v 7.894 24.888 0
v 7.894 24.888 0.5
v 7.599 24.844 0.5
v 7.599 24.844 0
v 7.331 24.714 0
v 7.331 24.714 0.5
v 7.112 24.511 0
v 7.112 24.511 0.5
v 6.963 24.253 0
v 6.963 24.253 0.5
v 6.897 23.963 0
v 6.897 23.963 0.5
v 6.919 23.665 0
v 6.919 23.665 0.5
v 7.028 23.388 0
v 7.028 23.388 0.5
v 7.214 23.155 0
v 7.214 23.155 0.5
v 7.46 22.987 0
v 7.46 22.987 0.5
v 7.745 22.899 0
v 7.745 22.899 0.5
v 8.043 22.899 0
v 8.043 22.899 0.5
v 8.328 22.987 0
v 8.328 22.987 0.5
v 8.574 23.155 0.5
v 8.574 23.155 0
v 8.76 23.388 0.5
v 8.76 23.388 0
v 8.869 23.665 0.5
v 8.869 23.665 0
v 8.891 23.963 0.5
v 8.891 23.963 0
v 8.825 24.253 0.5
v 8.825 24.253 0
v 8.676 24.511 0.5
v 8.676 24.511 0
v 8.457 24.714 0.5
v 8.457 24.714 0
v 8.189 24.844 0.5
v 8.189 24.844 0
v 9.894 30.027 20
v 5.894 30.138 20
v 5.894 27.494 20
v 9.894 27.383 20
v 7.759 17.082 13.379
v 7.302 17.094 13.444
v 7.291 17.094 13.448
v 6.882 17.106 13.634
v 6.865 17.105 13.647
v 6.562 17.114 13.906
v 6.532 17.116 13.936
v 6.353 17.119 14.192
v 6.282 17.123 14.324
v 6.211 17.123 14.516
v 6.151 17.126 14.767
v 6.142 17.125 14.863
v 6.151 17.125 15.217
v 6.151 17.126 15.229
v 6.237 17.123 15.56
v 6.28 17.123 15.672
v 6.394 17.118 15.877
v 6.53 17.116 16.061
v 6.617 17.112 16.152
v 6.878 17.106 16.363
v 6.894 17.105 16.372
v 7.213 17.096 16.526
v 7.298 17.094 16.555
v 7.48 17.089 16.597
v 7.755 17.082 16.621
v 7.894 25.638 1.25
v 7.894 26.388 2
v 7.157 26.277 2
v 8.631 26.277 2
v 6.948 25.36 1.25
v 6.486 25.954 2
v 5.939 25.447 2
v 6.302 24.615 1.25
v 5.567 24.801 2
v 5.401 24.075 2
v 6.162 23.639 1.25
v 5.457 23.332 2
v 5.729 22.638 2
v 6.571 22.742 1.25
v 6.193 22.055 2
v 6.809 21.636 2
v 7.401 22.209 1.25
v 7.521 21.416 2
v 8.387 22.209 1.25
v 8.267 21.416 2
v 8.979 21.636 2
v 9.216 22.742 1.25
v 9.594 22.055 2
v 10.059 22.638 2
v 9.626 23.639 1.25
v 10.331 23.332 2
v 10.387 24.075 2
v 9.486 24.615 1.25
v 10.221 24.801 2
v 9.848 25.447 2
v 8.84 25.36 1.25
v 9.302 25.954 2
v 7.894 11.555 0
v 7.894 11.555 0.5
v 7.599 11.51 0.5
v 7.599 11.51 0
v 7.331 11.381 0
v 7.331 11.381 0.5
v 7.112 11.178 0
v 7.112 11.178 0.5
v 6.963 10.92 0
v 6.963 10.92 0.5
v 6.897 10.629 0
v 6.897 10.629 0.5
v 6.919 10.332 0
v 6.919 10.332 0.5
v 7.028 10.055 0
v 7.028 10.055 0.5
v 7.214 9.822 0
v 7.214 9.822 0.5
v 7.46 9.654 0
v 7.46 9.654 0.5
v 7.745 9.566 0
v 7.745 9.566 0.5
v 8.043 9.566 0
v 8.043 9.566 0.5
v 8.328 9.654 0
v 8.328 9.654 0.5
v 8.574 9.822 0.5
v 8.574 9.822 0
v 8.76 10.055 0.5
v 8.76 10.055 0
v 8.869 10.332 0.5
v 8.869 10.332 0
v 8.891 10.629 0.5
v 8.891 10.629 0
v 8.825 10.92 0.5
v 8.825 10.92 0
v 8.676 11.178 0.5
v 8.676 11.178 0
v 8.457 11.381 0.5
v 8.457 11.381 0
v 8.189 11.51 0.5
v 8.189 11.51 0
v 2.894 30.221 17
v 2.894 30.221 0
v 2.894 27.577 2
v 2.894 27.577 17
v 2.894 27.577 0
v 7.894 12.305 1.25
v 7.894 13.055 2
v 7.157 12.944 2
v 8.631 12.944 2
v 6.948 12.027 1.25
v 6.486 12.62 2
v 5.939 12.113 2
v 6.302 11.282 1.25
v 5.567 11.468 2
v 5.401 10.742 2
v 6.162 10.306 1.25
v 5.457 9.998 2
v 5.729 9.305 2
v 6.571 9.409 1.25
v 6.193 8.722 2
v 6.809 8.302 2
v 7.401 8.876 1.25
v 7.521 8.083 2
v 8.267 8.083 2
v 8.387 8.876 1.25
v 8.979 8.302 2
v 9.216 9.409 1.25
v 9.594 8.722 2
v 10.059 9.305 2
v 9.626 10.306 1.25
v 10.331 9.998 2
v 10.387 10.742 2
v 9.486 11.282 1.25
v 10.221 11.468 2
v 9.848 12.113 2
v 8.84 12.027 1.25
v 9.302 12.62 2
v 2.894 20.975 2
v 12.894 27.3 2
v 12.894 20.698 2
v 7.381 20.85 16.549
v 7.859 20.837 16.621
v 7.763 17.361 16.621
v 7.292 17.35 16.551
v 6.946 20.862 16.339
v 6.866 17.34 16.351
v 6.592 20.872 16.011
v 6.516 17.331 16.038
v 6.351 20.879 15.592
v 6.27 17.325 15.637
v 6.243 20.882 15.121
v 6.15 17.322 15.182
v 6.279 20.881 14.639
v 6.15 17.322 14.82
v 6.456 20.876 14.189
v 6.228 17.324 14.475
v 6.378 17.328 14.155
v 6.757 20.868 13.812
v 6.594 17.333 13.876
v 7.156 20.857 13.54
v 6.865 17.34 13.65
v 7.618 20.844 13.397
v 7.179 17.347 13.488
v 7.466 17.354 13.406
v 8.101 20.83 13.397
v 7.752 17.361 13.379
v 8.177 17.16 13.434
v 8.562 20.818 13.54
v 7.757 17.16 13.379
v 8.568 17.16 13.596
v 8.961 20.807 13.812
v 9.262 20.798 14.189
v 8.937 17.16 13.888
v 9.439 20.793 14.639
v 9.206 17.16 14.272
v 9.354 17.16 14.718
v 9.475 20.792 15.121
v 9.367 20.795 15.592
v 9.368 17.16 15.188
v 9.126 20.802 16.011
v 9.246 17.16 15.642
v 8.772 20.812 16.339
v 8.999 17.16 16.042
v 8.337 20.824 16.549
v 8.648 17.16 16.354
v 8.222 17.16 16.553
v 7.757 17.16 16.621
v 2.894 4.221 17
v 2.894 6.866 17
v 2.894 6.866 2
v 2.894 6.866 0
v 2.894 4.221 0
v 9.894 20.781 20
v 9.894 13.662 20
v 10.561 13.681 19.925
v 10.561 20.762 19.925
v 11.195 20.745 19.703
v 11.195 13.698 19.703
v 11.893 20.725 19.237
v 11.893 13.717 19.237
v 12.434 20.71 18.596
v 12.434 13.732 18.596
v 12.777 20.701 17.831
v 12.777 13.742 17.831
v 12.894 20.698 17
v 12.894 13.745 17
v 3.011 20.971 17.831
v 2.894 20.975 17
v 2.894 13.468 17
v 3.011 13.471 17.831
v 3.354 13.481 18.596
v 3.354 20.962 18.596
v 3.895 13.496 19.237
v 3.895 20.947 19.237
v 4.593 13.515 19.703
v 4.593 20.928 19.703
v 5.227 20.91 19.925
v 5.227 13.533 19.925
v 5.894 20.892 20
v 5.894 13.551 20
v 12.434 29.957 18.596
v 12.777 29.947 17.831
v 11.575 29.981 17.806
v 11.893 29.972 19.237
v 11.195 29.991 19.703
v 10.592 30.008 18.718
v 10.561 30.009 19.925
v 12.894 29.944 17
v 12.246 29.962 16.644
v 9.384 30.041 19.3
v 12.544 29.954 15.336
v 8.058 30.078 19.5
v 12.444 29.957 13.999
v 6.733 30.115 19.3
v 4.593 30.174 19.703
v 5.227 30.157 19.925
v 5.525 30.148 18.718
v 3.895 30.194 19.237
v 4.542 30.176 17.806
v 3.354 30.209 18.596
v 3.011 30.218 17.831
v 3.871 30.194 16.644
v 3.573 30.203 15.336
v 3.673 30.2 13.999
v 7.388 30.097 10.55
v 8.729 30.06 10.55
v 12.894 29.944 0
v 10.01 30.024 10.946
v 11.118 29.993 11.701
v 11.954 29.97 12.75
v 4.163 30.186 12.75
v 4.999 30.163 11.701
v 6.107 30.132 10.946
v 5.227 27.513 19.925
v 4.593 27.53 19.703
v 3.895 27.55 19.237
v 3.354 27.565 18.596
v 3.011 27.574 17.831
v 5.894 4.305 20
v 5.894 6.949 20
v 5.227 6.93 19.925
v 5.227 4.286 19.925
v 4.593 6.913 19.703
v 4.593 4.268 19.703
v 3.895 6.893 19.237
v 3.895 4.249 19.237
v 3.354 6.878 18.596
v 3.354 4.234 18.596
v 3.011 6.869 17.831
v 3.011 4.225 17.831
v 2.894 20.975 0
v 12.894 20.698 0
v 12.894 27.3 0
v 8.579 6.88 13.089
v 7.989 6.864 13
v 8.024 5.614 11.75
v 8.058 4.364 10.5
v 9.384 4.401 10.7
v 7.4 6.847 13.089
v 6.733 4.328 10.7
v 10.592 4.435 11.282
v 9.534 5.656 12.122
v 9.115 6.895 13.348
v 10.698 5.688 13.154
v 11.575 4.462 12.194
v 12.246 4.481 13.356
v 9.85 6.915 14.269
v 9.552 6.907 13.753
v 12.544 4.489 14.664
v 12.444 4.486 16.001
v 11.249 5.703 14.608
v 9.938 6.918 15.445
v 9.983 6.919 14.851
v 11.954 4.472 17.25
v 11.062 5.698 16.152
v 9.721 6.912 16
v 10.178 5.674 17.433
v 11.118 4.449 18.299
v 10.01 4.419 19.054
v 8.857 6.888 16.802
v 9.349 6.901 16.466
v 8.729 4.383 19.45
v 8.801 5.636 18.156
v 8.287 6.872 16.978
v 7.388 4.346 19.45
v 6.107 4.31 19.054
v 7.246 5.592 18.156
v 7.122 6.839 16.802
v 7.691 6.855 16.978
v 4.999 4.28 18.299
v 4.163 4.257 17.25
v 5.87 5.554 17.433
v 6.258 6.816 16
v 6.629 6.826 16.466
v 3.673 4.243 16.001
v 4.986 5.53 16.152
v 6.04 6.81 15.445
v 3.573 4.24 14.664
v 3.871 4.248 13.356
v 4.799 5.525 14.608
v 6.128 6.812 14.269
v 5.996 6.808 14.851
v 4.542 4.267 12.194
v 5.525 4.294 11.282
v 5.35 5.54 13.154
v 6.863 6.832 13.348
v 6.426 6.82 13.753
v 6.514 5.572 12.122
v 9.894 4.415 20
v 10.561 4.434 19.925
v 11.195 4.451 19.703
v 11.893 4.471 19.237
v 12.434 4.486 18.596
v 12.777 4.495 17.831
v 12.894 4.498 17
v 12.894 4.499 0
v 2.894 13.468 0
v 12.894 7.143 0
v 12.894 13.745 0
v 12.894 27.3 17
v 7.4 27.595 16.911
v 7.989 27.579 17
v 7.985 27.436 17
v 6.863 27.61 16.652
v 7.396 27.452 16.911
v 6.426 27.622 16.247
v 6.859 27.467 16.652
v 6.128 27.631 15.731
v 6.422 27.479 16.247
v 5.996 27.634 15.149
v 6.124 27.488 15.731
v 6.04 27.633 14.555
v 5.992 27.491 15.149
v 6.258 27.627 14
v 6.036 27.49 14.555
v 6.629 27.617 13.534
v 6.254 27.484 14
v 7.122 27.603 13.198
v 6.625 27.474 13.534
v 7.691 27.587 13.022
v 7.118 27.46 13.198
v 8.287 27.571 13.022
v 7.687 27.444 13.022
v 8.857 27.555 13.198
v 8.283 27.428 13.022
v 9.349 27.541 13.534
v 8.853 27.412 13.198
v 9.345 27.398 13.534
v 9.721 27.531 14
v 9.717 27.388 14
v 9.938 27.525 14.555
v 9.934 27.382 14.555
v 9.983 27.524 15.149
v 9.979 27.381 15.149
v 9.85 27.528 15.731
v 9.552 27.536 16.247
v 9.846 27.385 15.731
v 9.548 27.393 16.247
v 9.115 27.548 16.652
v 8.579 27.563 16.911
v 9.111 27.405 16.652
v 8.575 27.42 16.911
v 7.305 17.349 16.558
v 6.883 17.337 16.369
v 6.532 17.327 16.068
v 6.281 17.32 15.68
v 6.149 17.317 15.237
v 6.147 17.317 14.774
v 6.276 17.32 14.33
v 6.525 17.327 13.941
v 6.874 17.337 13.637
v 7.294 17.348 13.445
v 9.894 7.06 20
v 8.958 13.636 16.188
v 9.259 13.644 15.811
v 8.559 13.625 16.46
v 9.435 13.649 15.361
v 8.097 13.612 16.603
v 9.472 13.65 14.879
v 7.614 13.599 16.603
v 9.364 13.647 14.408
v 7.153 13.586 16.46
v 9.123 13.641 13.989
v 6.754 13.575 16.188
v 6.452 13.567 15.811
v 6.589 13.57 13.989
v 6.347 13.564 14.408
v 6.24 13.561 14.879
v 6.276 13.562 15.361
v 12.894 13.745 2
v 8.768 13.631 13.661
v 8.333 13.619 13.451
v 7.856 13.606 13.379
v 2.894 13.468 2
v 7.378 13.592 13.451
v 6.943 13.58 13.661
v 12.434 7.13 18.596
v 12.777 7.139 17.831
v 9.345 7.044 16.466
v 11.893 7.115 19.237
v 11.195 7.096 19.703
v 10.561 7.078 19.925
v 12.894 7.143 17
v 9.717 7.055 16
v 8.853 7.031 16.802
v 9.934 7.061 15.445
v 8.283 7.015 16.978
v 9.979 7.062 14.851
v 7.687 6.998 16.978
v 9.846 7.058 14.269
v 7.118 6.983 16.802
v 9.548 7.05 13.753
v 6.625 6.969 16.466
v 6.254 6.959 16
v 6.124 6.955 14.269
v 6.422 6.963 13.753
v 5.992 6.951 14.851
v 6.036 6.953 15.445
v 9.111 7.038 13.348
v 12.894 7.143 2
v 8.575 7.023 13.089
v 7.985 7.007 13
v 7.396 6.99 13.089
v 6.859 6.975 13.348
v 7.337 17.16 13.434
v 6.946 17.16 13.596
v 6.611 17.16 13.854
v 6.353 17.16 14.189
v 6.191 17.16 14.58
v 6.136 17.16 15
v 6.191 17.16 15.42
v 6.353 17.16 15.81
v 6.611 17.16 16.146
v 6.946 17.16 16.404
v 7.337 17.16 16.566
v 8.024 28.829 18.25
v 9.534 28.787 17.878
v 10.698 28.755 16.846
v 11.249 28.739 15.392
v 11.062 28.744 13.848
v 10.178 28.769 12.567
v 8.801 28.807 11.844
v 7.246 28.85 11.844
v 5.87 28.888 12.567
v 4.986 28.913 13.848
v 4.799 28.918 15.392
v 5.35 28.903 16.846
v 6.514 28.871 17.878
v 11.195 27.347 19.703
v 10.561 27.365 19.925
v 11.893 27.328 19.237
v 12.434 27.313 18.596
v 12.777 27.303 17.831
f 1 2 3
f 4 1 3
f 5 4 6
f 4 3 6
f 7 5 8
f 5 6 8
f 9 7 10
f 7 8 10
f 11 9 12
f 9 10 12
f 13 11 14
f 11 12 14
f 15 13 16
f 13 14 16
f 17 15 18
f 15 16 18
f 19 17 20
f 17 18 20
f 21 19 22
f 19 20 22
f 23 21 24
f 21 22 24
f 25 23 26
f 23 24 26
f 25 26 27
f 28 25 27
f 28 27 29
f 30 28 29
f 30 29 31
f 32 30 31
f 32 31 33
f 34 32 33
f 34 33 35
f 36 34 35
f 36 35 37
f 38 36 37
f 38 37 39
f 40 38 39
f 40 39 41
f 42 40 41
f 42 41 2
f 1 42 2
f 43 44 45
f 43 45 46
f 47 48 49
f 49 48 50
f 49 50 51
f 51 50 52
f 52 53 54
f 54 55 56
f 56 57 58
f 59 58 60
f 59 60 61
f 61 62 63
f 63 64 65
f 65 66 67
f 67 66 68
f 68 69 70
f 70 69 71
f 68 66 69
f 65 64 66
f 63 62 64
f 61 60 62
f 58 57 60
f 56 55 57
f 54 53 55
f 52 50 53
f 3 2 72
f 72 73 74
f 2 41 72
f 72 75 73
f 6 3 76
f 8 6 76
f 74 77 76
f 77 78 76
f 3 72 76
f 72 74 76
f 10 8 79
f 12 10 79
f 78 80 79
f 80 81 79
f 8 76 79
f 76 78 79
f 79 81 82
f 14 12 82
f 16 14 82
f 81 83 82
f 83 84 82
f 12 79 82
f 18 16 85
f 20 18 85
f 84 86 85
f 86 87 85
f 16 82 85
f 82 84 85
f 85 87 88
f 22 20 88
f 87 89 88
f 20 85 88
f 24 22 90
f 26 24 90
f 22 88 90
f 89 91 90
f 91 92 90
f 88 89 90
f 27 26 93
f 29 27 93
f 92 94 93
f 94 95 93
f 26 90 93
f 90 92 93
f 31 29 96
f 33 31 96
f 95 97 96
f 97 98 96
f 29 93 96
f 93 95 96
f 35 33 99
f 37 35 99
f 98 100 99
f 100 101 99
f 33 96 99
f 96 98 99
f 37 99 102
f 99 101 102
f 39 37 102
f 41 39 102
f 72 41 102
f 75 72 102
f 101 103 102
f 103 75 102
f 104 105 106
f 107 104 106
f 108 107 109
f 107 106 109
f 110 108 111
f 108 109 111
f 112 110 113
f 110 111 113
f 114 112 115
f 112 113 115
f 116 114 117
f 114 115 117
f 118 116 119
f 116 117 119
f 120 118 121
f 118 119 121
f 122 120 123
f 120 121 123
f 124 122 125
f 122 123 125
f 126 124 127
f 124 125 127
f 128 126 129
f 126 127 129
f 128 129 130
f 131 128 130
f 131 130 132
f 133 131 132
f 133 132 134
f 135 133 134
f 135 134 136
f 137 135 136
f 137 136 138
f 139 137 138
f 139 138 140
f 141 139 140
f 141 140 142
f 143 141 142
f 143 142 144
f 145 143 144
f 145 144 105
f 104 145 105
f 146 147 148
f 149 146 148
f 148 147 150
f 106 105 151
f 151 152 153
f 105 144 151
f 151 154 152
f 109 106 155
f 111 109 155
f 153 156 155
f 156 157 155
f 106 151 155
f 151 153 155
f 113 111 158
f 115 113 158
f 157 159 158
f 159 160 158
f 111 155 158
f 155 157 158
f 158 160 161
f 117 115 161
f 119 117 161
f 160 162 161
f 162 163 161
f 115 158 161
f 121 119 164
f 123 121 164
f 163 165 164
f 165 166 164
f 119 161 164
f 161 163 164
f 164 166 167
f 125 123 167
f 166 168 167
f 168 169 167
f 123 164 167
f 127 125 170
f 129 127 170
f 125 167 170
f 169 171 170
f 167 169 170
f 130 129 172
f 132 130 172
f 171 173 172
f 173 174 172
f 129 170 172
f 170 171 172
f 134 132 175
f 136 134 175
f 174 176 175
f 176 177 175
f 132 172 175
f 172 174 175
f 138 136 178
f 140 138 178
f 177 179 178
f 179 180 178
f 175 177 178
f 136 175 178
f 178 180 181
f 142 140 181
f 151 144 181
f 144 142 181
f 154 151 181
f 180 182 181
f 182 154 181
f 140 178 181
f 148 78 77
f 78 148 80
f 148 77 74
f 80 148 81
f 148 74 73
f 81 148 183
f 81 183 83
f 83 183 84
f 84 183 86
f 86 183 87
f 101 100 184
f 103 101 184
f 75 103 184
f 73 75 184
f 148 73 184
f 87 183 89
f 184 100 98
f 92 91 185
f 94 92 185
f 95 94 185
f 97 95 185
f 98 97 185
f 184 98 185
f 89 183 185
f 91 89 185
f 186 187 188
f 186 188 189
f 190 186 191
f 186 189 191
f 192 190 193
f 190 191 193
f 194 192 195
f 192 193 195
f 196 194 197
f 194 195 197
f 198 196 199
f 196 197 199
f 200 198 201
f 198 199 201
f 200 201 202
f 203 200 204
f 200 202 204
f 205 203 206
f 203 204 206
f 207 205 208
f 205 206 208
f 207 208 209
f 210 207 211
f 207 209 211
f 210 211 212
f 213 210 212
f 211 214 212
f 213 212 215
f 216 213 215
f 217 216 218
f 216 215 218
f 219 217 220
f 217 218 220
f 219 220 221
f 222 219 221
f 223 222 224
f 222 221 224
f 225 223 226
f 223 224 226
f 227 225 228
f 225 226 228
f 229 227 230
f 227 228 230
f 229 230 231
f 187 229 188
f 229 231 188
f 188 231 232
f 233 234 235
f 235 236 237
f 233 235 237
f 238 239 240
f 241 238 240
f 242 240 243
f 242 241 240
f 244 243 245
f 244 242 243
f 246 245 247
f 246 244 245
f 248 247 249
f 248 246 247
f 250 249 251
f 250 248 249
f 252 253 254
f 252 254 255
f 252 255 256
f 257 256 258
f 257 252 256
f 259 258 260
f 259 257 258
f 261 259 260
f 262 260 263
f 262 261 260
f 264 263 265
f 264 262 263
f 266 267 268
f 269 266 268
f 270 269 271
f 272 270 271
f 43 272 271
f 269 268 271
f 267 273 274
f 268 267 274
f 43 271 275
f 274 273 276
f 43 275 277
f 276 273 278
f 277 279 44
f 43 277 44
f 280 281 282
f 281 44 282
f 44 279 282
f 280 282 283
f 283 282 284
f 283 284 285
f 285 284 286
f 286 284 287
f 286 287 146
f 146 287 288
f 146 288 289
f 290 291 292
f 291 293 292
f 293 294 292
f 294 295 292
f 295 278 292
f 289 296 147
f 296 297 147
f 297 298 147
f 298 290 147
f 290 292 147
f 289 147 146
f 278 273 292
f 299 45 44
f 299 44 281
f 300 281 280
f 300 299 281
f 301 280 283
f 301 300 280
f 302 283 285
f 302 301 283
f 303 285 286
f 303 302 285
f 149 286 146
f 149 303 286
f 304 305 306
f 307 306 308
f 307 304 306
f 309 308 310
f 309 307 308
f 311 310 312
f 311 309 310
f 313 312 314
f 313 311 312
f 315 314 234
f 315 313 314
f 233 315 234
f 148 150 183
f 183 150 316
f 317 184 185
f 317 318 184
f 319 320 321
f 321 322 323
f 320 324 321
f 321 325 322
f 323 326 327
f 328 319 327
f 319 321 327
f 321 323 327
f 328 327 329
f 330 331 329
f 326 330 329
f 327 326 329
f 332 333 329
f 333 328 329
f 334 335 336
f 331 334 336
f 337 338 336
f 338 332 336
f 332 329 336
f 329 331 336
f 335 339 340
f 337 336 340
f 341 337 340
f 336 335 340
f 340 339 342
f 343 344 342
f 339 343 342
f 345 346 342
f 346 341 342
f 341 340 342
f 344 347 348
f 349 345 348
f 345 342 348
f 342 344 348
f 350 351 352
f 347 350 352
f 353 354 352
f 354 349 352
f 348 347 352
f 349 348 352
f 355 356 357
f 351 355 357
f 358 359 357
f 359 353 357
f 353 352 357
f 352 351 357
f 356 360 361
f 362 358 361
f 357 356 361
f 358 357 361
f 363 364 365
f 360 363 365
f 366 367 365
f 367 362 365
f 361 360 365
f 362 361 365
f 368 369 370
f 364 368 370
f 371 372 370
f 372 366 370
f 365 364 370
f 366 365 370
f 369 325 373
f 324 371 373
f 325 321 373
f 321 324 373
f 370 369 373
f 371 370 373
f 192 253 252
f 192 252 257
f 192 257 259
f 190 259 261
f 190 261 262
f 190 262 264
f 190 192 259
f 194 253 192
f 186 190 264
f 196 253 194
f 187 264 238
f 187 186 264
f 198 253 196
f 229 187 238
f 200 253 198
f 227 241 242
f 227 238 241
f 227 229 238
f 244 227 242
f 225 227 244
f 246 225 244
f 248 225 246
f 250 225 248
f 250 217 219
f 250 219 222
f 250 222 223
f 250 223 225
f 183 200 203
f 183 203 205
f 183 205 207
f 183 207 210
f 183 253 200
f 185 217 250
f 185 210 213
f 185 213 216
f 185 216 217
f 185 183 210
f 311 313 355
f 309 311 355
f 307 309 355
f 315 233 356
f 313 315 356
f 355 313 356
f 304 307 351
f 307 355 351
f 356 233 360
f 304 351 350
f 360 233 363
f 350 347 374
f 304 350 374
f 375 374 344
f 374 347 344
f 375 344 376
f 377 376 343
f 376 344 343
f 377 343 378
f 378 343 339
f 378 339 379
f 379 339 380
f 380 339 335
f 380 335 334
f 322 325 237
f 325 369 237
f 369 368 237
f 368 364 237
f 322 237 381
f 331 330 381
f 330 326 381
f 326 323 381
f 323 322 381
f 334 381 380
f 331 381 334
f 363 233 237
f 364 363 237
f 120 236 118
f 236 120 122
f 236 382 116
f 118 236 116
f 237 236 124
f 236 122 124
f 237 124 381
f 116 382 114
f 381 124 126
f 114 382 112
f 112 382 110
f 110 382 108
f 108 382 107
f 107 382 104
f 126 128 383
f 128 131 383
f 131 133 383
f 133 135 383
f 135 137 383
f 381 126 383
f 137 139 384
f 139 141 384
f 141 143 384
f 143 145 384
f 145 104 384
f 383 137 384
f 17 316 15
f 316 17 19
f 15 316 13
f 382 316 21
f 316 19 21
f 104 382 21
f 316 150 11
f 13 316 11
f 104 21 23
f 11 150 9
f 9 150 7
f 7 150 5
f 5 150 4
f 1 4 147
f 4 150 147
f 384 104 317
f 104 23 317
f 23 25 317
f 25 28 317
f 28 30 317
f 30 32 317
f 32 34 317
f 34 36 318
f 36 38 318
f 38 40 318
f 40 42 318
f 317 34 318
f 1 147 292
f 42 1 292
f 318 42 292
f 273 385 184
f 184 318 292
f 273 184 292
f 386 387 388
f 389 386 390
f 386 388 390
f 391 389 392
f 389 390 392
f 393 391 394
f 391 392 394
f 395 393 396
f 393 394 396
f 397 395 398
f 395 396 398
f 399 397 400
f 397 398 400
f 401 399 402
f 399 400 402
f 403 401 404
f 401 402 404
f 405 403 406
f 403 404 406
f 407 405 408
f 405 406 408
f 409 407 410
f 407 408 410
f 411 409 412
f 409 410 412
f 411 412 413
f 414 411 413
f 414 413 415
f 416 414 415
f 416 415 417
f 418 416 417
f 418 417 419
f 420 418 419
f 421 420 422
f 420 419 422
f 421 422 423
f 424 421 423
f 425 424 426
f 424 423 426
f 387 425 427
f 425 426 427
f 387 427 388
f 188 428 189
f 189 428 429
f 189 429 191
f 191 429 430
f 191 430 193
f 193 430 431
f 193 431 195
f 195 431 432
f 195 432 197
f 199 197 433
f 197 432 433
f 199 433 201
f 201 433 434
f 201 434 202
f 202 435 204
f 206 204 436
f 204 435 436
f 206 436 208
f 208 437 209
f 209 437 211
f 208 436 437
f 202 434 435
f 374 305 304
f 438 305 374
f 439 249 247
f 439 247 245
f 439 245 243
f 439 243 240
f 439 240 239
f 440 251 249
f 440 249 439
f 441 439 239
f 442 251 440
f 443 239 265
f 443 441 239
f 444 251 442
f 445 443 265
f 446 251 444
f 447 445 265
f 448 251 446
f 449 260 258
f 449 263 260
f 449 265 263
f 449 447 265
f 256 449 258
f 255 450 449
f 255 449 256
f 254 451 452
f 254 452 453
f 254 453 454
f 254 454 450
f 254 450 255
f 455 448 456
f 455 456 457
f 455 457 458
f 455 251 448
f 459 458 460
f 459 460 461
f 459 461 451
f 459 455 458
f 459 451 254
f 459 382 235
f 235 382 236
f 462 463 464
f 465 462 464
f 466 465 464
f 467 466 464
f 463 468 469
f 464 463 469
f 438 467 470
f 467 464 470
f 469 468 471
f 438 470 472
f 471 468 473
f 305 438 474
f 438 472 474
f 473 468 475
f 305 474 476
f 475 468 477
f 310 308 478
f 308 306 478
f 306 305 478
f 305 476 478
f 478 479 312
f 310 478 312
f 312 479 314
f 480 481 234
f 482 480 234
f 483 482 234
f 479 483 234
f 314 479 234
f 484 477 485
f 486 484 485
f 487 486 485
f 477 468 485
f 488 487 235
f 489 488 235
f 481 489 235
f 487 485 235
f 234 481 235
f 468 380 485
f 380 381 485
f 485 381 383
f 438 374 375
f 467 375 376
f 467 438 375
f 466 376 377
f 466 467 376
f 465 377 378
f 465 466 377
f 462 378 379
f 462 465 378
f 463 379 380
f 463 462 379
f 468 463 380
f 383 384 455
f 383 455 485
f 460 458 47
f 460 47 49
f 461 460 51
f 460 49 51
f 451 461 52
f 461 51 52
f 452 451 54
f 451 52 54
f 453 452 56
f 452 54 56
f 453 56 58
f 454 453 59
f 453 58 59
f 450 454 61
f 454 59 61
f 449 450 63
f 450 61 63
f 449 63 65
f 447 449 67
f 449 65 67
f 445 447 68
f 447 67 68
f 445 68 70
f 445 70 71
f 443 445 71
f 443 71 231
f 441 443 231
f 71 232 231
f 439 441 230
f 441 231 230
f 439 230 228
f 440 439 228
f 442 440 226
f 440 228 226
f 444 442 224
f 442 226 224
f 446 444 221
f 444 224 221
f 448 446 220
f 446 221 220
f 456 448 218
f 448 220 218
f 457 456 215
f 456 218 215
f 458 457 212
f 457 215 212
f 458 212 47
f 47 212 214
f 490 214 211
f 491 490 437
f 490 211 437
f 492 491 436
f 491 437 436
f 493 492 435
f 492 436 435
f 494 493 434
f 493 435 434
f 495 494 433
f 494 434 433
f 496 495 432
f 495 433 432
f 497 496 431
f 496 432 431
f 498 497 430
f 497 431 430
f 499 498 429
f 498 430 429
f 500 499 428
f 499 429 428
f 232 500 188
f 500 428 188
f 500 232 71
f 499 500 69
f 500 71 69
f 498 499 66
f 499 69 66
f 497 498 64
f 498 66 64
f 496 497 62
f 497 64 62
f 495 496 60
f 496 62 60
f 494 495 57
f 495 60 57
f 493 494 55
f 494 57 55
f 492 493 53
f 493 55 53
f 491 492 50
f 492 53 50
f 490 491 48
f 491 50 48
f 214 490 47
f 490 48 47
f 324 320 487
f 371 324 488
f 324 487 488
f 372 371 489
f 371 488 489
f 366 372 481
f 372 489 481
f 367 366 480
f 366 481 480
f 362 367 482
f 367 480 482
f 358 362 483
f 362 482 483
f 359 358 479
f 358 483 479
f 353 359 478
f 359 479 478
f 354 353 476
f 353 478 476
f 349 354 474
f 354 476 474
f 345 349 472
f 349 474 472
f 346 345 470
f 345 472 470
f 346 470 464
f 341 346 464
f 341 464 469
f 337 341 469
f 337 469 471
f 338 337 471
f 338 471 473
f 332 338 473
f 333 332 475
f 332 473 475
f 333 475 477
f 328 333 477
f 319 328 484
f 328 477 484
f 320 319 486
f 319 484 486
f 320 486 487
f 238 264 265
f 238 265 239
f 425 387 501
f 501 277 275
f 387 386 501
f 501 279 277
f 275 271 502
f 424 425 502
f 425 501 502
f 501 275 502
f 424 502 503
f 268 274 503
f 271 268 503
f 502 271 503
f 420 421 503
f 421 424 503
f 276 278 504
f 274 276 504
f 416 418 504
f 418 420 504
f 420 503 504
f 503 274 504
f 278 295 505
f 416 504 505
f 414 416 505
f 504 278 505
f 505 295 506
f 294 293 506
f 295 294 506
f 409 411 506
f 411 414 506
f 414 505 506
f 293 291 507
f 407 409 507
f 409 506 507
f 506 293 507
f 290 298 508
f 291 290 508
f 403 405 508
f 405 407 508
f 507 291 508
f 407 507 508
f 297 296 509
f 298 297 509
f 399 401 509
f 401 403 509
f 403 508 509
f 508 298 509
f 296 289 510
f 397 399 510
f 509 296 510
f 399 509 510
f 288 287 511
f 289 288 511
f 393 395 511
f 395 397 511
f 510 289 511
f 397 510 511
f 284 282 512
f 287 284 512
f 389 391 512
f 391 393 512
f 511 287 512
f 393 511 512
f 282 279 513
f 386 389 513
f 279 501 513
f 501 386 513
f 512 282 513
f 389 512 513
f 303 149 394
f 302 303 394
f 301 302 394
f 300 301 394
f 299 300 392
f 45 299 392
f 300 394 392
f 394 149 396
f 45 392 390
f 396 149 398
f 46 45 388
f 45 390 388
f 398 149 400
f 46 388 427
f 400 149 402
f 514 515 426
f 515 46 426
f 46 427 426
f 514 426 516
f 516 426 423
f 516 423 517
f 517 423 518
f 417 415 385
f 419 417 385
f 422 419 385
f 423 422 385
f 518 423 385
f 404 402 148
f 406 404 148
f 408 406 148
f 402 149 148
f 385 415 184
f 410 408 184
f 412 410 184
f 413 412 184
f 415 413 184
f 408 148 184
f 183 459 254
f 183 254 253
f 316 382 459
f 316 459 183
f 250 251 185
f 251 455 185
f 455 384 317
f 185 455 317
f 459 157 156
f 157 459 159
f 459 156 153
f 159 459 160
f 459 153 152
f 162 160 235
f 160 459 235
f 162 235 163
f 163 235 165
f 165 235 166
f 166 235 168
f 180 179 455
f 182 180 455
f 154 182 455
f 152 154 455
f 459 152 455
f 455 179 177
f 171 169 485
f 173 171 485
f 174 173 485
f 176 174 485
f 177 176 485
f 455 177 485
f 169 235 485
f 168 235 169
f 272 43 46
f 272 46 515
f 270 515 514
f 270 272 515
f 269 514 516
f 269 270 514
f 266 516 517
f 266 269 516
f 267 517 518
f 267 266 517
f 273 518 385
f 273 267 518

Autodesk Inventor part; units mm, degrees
ref_plane "YZ Plane" through (0, 0, 0) normal (1, 0, 0) x (0, 1, 0)
ref_plane "XZ Plane" through (0, 0, 0) normal (0, 1, 0) x (-1, 0, 0)
ref_plane "XY Plane" through (0, 0, 0) normal (0, 0, 1) x (1, 0, 0)
sketch "Skizze1" plane through (0, 0, 0) normal (0, 0, 1) x (1, 0, 0)
  line L0 (12.8939, 29.9442) -> (2.8939, 30.2214)
  line L1 (2.8939, 30.2214) -> (2.8939, 27.5773)
  line L2 (2.8939, 27.5773) -> (12.8939, 27.3001)
  line L3 (12.8939, 27.3001) -> (12.8939, 29.9442)
  line L4 (12.8939, 7.1427) -> (2.8939, 6.8655)
  line L5 (2.8939, 6.8655) -> (2.8939, 4.2214)
  line L6 (2.8939, 4.2214) -> (12.8939, 4.4985)
  line L7 (12.8939, 4.4985) -> (12.8939, 7.1427)
  line L8 (2.8939, 20.9747) -> (12.8939, 20.6975)
  line L9 (12.8939, 13.7452) -> (2.8939, 13.468)
  line L10 (16.8904, 10.5547) -> (7.8939, 10.3054) construction
  line L11 (16.8904, 23.888) -> (7.8939, 24.1374) construction
  line L12 (16.8904, 10.5547) -> (16.8904, 23.888) construction
  line L13 (2.8939, 20.9747) -> (12.8939, 27.3001) construction
  line L14 (2.8939, 13.468) -> (12.8939, 7.1427) construction
  line L15 (2.8939, 13.468) -> (2.8939, 20.9747)
  line L16 (12.8939, 13.7452) -> (12.8939, 20.6975)
  point P0 (7.8939, 7.0041)
  dimension "d36" = 9
  dimension "d37" = 13.3333
  dimension "d38" = 91.588
  dimension "d39" = 91.588
  dimension "d40" = 10
  dimension "d41" = 6.6
  dimension "d42" = 6.6
  dimension "d43" = 13.8321
  dimension "d58" = 26
extrude "Extrusion1" add sketch "Skizze1" along normal blind 20
fillet "Rundung1" radius 3 6 edges at (12.8939, 5.8206, 20) (12.8939, 28.6221, 20) (2.8939, 28.8993, 20) (2.8939, 5.5434, 20) (12.8939, 17.2214, 20) (2.8939, 17.2214, 20)
sketch "Skizze4" plane through (2.8939, 22.0416, 0) normal (0, 0, 1) x (1, 0, 0)
  line L0 (9.5, -17.8202) -> (0.5, -17.8202) construction
  line L1 (7, 7.9858) -> (3, 8.0966) construction
  line L2 (5, -11.7363) -> (5, -11.4869) construction
  line L3 (5, 1.8464) -> (5, 2.0958) construction
  dimension "d59" = 13.3333
sketch "Skizze6" plane through (2.8939, 4.2214, 0) normal (0, 0, -1) x (0.9992829, 0.0378646, 0)
  line L0 (10.9668, -25.3257) -> (0.9845, -25.9814) projected
  line L1 (0, 0) -> (10.0033, 0.1017) projected
  line L2 (0.9845, -25.9814) -> (0, 0)
  line L3 (10.9668, -25.3257) -> (10.0033, 0.1017)
extrude "Extrusion3" add sketch "Skizze6" against normal blind 2
hole "Bohrung4" at (7.8939, 10.5547, 0) at (7.8939, 23.888, 0) direction (0, 0, 1) diameter 2 end through all
chamfer "Fasen1" distance 1.5 angle 45 2 edges at (7.8939, 22.888, 2) (7.8939, 9.5547, 2)
sketch "Skizze7" plane through (12.8939, 4.4985, 0) normal (0.0277065, -0.9996161, 0) x (0.9996161, 0.0277065, 0)
  line L0 (-4.8372, 0) -> (-4.8372, 15) construction
  point P0 (-13.0135, 0)
  dimension "d60" = 15
hole "Bohrung5" at (8.0585, 4.3645, 15) direction (-0.0277065, 0.9996161, 0) diameter 4 depth 2.6431 countersink diameter 9 countersink angle 90
sketch "Skizze8" plane through (12.8939, 4.4985, 0) normal (0.0277065, -0.9996161, 0) x (0.9996161, 0.0277065, 0)
  circle A0 centre (-4.7839, 15) radius 2.0011 projected
  point P0 (-13.0135, 0)
hole "Bohrung6" at (8.1118, 4.366, 15) direction (-0.0277065, 0.9996161, 0) diameter 3.242 depth 13 tip angle 118 thread size "M4x0.7" class "6H" standard "ANSI Metric M Profile"
sketch "Skizze9" plane through (2.8939, 30.2214, 17) normal (0.0277065, 0.9996161, 0) x (0.9996161, -0.0277065, 0)
  line L0 (5.1666, 17) -> (5.1666, 2) construction
  point P0 (-2.0554, 17)
  dimension "d75" = 15
hole "Bohrung7" at (8.0585, 30.0782, 15) direction (-0.0277065, -0.9996161, 0) diameter 4 depth 2.6431 countersink diameter 9 countersink angle 90
sketch "Skizze10" plane through (2.8939, 30.2214, 17) normal (0.0277065, 0.9996161, 0) x (0.9996161, -0.0277065, 0)
  circle A0 centre (5.2233, 2) radius 2.0011 projected
  point P0 (-2.0554, 17)
hole "Bohrung8" at (8.1152, 30.0767, 15) direction (-0.0277065, -0.9996161, 0) diameter 3.242 depth 13 tip angle 118 thread size "M4x0.7" class "6H" standard "ANSI Metric M Profile"
properties part number "HalterUmlenkrolleDPL" material "PC/ABS-Kunststoff, 3DDruck, PLA"
